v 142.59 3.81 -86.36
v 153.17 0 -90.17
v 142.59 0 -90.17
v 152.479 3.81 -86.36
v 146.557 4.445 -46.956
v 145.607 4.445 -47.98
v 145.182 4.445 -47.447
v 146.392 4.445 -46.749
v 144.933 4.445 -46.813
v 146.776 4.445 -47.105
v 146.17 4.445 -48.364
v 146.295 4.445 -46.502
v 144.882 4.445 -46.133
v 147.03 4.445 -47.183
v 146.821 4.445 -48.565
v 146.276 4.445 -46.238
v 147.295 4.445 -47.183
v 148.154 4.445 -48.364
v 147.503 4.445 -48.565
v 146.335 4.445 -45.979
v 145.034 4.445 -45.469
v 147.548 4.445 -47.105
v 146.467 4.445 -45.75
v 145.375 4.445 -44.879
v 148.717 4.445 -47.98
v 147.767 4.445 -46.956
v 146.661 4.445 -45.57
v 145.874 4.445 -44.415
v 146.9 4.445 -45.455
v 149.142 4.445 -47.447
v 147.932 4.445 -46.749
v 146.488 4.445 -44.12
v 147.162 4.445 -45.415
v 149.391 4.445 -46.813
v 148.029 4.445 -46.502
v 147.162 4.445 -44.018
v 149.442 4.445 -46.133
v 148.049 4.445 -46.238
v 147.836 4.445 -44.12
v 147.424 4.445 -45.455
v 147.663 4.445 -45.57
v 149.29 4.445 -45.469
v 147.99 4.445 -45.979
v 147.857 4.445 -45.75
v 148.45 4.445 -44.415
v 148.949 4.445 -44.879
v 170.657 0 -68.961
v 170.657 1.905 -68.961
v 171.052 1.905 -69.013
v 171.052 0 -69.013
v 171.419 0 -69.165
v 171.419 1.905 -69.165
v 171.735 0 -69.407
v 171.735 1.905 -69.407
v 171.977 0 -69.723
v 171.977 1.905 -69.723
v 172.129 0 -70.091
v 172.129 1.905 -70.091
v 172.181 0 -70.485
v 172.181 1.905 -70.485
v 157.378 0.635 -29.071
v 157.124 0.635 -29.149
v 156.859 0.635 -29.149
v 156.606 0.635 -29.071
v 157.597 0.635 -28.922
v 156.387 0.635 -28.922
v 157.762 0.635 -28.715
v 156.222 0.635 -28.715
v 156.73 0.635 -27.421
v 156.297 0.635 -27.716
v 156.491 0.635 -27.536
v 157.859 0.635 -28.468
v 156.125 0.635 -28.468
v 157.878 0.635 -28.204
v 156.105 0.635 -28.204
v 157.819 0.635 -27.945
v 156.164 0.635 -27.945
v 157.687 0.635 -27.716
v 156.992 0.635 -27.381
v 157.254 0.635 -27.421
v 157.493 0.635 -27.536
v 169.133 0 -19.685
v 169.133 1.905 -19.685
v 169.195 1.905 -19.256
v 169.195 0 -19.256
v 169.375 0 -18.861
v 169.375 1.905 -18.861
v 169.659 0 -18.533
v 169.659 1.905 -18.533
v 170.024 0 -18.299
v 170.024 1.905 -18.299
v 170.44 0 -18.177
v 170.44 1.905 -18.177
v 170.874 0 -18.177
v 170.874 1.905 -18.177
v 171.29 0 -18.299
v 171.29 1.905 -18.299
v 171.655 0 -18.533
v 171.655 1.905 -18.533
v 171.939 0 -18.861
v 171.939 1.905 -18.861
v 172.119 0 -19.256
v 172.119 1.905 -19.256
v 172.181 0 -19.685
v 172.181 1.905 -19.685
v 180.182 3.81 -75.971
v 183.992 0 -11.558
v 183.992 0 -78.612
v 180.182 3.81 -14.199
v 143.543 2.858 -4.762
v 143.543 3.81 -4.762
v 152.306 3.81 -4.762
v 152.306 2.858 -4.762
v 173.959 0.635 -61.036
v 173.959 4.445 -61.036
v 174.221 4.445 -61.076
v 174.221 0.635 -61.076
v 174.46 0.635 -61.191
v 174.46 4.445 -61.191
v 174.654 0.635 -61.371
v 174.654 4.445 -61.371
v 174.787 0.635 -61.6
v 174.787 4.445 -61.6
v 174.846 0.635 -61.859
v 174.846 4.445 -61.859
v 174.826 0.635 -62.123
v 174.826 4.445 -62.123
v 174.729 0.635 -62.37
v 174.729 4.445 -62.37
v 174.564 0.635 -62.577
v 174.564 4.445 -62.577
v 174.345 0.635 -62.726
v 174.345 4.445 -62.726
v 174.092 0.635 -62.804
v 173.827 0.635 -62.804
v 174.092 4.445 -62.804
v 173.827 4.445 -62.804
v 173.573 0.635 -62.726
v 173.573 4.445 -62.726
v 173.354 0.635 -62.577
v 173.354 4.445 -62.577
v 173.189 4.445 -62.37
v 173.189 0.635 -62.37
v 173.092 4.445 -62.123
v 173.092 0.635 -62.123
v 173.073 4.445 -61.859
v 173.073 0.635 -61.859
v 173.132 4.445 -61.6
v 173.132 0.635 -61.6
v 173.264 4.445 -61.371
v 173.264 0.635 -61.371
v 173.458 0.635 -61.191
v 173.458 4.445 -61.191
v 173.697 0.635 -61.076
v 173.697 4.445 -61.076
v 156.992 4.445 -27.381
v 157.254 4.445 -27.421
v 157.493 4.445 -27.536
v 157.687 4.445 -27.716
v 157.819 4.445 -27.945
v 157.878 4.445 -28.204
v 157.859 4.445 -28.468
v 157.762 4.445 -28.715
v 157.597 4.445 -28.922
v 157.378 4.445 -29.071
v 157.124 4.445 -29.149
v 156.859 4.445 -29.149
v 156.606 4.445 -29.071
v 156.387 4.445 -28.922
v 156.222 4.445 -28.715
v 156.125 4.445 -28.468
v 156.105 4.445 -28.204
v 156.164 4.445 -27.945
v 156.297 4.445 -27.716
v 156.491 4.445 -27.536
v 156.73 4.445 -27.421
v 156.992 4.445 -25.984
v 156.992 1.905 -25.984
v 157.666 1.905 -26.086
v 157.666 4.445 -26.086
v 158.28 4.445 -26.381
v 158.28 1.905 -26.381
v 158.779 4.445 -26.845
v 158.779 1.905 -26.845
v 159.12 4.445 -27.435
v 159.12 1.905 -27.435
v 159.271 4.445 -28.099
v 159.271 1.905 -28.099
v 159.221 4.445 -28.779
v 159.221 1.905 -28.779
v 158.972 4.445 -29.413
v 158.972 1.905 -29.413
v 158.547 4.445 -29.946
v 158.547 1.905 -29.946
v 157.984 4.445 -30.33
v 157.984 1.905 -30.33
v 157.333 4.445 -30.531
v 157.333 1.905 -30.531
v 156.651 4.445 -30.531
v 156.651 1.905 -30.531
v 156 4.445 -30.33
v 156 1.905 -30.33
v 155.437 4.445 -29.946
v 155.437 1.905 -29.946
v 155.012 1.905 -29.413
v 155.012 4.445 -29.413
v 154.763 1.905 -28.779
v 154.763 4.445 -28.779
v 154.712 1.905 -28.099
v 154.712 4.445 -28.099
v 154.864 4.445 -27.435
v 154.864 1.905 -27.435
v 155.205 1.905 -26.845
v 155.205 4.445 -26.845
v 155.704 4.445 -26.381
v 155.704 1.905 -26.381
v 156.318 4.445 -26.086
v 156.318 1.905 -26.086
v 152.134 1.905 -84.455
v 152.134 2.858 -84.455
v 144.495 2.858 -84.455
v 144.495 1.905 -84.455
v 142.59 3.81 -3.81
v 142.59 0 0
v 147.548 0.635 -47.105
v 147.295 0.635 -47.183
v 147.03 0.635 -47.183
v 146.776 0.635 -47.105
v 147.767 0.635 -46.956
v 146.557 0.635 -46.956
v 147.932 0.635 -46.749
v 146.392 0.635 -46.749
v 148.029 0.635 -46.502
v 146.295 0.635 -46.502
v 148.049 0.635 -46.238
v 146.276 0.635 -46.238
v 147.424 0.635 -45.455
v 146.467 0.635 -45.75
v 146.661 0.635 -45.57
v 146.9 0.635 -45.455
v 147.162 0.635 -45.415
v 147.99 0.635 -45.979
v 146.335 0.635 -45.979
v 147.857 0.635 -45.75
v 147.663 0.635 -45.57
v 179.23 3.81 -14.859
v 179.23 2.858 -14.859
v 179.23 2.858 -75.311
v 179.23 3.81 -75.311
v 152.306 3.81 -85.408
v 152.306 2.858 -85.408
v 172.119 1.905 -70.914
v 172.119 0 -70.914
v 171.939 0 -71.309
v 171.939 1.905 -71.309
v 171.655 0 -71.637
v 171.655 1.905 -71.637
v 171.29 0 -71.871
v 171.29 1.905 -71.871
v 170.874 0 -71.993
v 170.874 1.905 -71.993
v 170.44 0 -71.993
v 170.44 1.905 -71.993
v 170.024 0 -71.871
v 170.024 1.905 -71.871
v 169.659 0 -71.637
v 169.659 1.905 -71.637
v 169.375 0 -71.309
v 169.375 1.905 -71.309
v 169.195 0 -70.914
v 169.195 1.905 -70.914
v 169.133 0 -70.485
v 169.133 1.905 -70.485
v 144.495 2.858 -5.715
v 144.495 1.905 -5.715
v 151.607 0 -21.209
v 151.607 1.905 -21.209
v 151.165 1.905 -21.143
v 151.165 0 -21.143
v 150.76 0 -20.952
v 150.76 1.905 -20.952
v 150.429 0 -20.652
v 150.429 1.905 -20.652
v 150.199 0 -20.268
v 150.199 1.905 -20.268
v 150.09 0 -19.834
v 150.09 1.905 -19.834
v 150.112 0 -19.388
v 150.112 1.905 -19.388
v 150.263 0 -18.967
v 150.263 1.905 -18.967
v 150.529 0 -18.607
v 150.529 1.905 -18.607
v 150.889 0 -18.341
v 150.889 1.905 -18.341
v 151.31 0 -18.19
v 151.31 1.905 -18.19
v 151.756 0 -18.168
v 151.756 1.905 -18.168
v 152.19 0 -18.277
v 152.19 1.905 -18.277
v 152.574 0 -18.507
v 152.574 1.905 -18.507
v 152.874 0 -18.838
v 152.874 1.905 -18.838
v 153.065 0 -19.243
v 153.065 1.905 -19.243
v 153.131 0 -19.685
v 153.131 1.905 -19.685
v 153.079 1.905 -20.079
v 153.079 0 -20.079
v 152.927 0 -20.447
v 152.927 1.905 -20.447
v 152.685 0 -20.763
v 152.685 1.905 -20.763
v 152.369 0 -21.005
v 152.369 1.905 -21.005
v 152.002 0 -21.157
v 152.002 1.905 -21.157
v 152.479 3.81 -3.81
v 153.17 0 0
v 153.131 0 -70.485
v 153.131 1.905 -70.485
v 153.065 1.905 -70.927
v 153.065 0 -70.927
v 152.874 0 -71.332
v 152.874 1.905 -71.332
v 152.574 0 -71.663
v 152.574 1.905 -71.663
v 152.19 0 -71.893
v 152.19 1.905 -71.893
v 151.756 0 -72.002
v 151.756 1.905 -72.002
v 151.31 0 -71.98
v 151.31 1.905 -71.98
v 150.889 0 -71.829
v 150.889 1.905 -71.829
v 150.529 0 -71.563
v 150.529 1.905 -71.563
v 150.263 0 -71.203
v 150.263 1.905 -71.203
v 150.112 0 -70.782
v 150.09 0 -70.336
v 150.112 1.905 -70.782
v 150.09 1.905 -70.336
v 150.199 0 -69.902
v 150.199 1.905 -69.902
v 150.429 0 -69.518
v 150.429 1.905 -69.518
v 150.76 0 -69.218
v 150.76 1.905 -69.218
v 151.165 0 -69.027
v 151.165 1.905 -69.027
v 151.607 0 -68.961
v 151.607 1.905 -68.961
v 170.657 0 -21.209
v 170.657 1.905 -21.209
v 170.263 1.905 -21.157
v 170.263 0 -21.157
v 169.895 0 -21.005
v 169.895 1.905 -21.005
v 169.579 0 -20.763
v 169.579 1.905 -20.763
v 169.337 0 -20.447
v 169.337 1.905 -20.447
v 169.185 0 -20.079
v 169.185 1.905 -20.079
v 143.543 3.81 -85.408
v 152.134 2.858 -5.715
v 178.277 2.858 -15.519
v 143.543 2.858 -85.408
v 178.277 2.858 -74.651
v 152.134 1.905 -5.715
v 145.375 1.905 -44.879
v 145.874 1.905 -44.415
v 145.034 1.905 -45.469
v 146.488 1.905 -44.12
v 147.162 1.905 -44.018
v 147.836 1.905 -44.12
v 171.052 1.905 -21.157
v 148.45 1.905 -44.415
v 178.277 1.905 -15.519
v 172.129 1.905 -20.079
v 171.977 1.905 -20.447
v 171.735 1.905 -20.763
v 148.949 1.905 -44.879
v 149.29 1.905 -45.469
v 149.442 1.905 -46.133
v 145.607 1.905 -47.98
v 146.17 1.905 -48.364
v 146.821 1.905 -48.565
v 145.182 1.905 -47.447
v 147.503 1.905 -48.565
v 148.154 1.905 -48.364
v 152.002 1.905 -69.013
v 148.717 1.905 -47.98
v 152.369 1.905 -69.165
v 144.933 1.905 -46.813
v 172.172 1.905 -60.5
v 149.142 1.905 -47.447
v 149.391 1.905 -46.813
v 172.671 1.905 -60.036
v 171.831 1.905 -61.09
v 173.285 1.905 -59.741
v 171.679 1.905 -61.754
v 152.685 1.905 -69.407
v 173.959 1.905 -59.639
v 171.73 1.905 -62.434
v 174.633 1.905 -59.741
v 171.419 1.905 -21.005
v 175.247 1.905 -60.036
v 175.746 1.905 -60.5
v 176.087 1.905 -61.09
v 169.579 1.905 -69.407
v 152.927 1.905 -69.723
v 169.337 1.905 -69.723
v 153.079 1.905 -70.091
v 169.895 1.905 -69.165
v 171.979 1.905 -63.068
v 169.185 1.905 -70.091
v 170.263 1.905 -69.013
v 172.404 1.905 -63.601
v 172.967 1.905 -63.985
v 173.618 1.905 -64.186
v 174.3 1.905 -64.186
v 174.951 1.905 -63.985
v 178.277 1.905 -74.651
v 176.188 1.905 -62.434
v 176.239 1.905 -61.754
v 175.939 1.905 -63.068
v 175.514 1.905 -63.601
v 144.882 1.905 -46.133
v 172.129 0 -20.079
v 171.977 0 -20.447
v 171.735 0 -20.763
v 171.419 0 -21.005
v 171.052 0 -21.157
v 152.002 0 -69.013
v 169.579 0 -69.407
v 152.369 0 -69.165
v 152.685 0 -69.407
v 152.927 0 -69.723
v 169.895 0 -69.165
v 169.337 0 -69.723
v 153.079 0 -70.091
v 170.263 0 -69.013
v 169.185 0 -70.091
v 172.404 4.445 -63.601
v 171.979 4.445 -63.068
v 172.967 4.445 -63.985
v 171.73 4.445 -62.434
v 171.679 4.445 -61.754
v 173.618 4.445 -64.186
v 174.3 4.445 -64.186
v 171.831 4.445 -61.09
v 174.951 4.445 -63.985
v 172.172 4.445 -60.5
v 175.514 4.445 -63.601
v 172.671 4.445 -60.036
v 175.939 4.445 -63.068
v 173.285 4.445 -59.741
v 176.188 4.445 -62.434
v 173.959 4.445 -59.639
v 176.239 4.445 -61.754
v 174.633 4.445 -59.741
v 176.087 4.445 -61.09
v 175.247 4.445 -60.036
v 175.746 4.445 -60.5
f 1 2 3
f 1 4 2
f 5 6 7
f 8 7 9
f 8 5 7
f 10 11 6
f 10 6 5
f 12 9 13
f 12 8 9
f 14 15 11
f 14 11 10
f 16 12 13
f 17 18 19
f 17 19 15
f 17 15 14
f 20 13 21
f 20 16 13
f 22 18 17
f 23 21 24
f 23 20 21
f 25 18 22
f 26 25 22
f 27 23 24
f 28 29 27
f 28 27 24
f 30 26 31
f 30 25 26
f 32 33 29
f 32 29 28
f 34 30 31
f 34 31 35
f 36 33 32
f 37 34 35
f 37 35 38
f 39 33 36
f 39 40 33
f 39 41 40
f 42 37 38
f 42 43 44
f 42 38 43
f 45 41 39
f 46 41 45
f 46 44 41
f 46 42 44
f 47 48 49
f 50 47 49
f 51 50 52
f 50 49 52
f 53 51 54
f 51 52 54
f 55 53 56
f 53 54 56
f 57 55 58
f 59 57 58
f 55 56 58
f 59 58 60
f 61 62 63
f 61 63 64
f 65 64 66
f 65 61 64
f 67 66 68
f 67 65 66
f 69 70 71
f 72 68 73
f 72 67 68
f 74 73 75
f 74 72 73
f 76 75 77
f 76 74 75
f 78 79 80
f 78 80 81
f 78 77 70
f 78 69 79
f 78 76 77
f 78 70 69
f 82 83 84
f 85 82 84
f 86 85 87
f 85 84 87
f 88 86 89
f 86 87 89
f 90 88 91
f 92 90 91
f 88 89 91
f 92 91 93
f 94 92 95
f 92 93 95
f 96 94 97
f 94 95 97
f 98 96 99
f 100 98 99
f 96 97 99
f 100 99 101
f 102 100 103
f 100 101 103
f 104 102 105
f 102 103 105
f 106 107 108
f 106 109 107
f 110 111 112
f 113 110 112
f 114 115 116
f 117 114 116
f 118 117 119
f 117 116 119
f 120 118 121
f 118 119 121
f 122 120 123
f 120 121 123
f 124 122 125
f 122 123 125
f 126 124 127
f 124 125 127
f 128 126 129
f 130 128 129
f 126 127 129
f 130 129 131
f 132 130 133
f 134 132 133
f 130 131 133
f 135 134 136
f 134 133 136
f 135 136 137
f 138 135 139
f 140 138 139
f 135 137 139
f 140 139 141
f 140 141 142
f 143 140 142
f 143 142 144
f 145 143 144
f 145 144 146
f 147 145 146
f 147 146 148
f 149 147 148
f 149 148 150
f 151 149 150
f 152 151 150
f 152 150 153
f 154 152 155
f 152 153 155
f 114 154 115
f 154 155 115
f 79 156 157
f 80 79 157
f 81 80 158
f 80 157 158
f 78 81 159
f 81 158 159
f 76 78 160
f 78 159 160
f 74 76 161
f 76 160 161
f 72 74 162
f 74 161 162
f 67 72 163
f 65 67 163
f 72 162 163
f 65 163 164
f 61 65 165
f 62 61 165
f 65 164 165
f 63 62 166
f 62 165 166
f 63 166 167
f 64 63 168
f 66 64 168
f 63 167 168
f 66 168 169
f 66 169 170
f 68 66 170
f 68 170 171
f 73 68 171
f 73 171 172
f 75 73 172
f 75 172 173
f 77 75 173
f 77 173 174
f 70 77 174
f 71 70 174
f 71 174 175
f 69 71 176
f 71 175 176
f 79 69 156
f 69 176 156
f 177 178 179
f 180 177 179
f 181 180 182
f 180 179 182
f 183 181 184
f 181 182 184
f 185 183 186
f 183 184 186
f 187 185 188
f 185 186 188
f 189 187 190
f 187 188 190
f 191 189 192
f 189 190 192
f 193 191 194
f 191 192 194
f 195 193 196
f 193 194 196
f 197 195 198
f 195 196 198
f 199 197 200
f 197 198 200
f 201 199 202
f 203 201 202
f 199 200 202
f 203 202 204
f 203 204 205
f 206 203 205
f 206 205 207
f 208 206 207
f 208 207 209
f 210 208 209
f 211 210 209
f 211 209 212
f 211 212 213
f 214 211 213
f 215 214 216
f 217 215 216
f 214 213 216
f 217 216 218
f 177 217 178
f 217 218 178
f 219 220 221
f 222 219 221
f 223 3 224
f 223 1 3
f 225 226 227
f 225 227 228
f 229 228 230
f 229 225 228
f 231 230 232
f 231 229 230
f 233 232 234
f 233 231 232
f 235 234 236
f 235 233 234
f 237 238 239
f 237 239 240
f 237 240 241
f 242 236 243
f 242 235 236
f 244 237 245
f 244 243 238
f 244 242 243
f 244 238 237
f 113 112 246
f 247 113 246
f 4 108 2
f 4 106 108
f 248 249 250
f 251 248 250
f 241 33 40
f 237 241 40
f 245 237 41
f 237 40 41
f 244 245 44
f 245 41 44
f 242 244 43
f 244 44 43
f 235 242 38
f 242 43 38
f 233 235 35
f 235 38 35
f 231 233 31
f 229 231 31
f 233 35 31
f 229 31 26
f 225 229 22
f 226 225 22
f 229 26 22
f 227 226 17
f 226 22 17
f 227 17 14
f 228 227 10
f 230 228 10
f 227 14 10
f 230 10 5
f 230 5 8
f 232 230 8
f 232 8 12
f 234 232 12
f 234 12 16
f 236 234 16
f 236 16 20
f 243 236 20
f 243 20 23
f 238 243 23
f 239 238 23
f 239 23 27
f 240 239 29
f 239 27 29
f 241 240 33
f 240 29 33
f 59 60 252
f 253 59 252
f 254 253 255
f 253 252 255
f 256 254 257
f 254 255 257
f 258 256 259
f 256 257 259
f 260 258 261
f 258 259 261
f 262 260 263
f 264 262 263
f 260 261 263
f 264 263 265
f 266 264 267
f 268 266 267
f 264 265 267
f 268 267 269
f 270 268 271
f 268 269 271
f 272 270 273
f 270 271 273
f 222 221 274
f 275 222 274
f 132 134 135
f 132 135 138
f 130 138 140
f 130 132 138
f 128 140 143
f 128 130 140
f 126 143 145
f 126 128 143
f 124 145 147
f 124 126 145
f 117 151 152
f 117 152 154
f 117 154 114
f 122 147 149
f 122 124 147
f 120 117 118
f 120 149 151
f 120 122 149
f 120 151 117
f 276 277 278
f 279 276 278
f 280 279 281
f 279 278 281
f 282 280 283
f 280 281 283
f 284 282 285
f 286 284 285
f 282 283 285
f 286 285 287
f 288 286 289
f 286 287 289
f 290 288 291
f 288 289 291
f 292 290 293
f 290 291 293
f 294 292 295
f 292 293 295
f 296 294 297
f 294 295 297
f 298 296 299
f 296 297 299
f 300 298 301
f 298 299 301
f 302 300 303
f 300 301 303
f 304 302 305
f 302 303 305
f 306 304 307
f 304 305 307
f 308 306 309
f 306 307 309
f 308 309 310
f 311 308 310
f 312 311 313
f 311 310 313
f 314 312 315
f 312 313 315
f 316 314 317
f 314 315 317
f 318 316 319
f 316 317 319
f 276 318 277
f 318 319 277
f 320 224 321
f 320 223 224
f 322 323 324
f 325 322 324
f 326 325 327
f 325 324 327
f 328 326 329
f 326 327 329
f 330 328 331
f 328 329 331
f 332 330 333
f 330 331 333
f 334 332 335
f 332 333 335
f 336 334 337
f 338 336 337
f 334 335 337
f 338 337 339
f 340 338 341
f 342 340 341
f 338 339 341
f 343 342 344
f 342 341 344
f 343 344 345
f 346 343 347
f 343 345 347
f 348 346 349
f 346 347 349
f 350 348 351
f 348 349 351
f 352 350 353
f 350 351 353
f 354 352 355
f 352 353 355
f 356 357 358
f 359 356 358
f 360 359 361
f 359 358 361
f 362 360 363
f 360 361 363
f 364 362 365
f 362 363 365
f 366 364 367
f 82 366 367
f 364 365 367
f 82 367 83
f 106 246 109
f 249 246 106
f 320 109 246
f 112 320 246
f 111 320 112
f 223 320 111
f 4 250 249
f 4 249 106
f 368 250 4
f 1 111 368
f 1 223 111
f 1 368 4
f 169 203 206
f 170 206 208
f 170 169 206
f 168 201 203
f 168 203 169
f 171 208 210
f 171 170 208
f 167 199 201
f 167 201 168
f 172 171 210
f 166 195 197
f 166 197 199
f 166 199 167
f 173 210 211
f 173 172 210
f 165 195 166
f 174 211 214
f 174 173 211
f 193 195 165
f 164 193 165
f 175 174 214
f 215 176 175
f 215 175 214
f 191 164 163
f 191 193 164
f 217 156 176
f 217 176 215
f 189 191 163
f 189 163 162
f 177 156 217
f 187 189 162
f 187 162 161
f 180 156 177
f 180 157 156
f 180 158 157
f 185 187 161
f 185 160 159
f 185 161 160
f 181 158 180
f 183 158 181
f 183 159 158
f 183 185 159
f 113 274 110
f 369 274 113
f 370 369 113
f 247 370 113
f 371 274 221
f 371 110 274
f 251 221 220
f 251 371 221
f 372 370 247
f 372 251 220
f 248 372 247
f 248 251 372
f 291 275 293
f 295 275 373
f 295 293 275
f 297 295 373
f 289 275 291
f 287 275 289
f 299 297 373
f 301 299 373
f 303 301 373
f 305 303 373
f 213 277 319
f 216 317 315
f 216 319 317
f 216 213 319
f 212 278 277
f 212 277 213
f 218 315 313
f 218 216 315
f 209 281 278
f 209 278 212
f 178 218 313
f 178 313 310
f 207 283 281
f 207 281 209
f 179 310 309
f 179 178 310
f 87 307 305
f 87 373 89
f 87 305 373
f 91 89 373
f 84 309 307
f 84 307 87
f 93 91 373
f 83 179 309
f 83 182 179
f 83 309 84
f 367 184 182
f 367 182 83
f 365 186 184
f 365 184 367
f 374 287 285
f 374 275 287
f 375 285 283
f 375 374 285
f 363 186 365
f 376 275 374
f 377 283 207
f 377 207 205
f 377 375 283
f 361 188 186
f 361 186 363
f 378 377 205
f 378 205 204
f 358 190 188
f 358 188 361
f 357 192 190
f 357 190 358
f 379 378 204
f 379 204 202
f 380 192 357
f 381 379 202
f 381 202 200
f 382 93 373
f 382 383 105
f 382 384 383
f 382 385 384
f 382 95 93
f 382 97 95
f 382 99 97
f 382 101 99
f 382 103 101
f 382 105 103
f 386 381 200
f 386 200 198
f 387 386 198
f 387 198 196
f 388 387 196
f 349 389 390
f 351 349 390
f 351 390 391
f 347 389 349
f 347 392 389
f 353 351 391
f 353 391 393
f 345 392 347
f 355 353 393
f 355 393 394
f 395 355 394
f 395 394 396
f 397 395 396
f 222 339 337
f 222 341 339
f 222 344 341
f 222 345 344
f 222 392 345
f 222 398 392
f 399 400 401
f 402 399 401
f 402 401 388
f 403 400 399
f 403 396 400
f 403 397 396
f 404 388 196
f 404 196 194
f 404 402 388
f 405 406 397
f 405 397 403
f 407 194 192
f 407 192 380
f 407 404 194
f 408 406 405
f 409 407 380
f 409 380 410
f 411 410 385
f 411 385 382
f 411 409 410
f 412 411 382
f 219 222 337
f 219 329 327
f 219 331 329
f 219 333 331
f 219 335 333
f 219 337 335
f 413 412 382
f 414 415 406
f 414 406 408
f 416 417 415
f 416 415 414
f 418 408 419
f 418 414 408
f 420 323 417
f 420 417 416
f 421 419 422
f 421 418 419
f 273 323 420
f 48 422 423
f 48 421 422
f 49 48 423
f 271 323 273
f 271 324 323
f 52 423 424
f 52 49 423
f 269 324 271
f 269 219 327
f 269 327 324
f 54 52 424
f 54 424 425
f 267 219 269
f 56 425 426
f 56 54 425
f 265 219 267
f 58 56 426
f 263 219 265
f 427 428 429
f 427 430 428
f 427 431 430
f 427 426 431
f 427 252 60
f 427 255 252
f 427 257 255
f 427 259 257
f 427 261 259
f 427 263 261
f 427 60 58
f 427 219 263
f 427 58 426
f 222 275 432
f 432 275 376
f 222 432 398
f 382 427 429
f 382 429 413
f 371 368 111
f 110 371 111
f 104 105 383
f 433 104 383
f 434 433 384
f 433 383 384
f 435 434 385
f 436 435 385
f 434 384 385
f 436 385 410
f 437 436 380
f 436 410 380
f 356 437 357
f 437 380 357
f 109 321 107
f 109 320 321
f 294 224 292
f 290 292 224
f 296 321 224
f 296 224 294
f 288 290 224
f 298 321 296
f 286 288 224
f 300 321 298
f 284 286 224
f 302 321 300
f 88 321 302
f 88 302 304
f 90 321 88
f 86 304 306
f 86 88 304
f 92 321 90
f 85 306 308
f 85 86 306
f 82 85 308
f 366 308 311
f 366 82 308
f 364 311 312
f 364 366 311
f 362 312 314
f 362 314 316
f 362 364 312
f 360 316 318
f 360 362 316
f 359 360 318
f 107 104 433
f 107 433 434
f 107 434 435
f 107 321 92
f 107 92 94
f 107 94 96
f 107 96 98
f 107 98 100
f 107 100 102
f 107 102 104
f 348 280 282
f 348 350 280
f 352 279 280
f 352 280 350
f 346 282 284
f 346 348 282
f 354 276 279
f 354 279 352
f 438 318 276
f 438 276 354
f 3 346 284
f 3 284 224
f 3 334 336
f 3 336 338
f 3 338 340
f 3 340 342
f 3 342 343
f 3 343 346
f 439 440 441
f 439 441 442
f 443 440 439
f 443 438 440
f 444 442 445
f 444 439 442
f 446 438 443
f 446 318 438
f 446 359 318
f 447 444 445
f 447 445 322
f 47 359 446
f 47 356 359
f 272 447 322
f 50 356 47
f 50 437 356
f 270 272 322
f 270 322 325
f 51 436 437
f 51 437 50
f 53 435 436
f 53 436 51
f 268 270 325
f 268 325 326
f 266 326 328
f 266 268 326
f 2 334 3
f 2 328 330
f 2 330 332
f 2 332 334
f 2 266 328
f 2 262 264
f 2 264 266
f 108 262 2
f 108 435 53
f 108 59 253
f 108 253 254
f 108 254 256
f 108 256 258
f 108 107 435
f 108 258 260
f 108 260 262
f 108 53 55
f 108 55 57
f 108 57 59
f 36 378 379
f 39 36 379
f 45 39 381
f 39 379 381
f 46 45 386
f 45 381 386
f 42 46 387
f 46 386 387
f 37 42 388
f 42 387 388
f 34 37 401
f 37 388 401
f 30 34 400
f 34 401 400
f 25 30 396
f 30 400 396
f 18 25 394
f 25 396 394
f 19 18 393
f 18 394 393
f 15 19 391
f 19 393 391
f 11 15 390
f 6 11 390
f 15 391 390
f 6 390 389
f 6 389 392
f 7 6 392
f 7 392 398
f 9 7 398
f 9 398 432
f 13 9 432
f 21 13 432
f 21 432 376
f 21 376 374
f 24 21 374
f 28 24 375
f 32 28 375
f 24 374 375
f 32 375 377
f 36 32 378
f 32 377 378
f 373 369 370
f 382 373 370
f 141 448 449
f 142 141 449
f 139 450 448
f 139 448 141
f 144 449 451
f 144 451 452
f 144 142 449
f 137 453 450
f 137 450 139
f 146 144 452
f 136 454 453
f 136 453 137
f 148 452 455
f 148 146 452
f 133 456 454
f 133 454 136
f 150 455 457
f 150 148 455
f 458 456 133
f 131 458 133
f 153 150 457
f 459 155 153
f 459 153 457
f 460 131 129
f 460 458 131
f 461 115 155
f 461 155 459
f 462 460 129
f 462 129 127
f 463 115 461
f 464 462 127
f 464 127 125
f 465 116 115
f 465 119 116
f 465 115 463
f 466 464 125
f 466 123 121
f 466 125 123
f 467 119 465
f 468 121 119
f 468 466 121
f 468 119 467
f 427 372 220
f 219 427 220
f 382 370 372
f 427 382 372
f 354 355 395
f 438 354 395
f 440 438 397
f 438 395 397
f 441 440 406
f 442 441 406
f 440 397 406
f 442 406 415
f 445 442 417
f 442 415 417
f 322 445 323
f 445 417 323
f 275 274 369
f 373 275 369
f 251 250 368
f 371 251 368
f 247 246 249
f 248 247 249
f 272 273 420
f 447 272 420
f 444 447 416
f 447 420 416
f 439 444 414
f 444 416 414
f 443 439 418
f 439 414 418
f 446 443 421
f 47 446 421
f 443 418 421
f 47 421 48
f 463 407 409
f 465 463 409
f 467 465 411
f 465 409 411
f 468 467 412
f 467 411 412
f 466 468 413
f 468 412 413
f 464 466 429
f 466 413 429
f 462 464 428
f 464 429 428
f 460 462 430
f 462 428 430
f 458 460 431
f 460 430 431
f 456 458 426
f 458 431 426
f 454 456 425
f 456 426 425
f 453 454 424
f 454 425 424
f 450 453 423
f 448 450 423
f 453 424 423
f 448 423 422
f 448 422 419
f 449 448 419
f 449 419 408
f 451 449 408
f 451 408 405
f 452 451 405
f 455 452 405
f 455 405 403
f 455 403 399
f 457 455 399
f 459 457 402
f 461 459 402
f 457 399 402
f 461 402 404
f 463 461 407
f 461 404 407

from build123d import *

# Parameters (mm, degrees)
CUT_EXTRUDE4_DEPTH  = 1.905
SKETCH15_R          = 2.286
BOSS_EXTRUDE3_DEPTH = 2.54
SKETCH17_R          = 0.889
CUT_EXTRUDE5_DEPTH  = 3.81
CUT_EXTRUDE6_DEPTH  = 0.9525
CUT_EXTRUDE9_DEPTH  = 205.915011065


with BuildPart() as part:
    # Sketch2 → Loft3 section 0
    with BuildSketch(Plane(origin=(0, 0, 0), x_dir=(1, 0, 0), z_dir=(0, 1, 0))):
        with BuildLine():
            Line((153.170003889, 0), (183.992068321, 11.558274162))
            Line((183.992068321, 11.558274162), (183.992068321, 78.611725838))
            Line((183.992068321, 78.611725838), (153.170003889, 90.17))
            Line((153.170003889, 90.17), (142.590068321, 90.17))
            Line((142.590068321, 90.17), (142.590068321, 0))
            Line((142.590068321, 0), (153.170003889, 0))
        make_face()
    # Sketch3 → Loft3 section 1
    with BuildSketch(Plane(origin=(0, 3.81, 0), x_dir=(1, 0, 0), z_dir=(0, 1, 0))):
        with BuildLine():
            Line((142.590068321, 3.81), (142.590068321, 86.36))
            Line((142.590068321, 86.36), (152.479119132, 86.36))
            Line((152.479119132, 86.36), (180.182068321, 75.971394054))
            Line((180.182068321, 75.971394054), (180.182068321, 14.198605946))
            Line((180.182068321, 14.198605946), (152.479119132, 3.81))
            Line((152.479119132, 3.81), (142.590068321, 3.81))
        make_face()
    loft()

    # Sketch14 → Cut-Extrude4 (cut)
    with BuildSketch(Plane(origin=(0, 3.81, 0), x_dir=(1, 0, 0), z_dir=(0, 1, 0))):
        Polygon((178.277068321, 74.651228162), (152.133676754, 84.455), (144.495068321, 84.455), (144.495068321, 5.715), (152.133676754, 5.715), (178.277068321, 15.518771838), align=None)
    extrude(amount=-CUT_EXTRUDE4_DEPTH, mode=Mode.SUBTRACT)

    # Sketch15 → Boss-Extrude3 (add)
    with BuildSketch(Plane(origin=(0, 1.905, 0), x_dir=(1, 0, 0), z_dir=(0, 1, 0))):
        with Locations(Location((173.959068321, 61.9252, 0), (0, 0, 270))):
            Circle(SKETCH15_R)
        with Locations(Location((147.162068321, 46.3042, 0), (0, 0, 270))):
            Circle(SKETCH15_R)
        with Locations(Location((156.991868321, 28.2702, 0), (0, 0, 270))):
            Circle(SKETCH15_R)
    extrude(amount=BOSS_EXTRUDE3_DEPTH)

    # Sketch17 → Cut-Extrude5 (cut)
    with BuildSketch(Plane(origin=(0, 4.445, 0), x_dir=(1, 0, 0), z_dir=(0, 1, 0))):
        with Locations(Location((156.991868321, 28.2702, 0), (0, 0, 270))):
            Circle(SKETCH17_R)
        with Locations(Location((147.162068321, 46.3042, 0), (0, 0, 270))):
            Circle(SKETCH17_R)
        with Locations(Location((173.959068321, 61.9252, 0), (0, 0, 270))):
            Circle(SKETCH17_R)
    extrude(amount=-CUT_EXTRUDE5_DEPTH, mode=Mode.SUBTRACT)

    # Sketch18 → Cut-Extrude6 (cut)
    with BuildSketch(Plane(origin=(0, 3.81, 0), x_dir=(1, 0, 0), z_dir=(0, 1, 0))):
        Polygon((179.229568321, 14.858688892), (179.229568321, 75.311311108), (152.306397943, 85.4075), (143.542568321, 85.4075), (143.542568321, 4.7625), (152.306397943, 4.7625), align=None)
        Polygon((178.277068321, 15.518771838), (178.277068321, 74.651228162), (152.133676754, 84.455), (144.495068321, 84.455), (144.495068321, 5.715), (152.133676754, 5.715), align=None, mode=Mode.SUBTRACT)
    extrude(amount=-CUT_EXTRUDE6_DEPTH, mode=Mode.SUBTRACT)

    # Sketch22 → Cut-Extrude9 (cut, through all)
    with BuildSketch(Plane(origin=(0, 1.905, 0), x_dir=(1, 0, 0), z_dir=(0, 1, 0))):
        with BuildLine():
            ThreePointArc((170.657068321, 21.209), (169.579437586, 20.762630735), (169.133068321, 19.685))
            Line((169.133068321, 19.685), (170.657068321, 19.685))
            Line((170.657068321, 19.685), (170.657068321, 21.209))
        make_face()
        with BuildLine():
            Line((170.657068321, 19.685), (169.133068321, 19.685))
            ThreePointArc((169.133068321, 19.685), (170.657068321, 18.161), (172.181068321, 19.685))
            ThreePointArc((172.181068321, 19.685), (171.734699055, 20.762630735), (170.657068321, 21.209))
            Line((170.657068321, 21.209), (170.657068321, 19.685))
        make_face()
        with BuildLine():
            ThreePointArc((151.607068321, 21.209), (150.529437586, 18.607369265), (153.131068321, 19.685))
            Line((153.131068321, 19.685), (151.607068321, 19.685))
            Line((151.607068321, 19.685), (151.607068321, 21.209))
        make_face()
        with BuildLine():
            Line((151.607068321, 19.685), (153.131068321, 19.685))
            ThreePointArc((153.131068321, 19.685), (152.684699055, 20.762630735), (151.607068321, 21.209))
            Line((151.607068321, 21.209), (151.607068321, 19.685))
        make_face()
        with BuildLine():
            ThreePointArc((169.133068321, 70.485), (169.579437586, 69.407369265), (170.657068321, 68.961))
            Line((170.657068321, 68.961), (170.657068321, 70.485))
            Line((170.657068321, 70.485), (169.133068321, 70.485))
        make_face()
        with BuildLine():
            Line((170.657068321, 70.485), (170.657068321, 68.961))
            ThreePointArc((170.657068321, 68.961), (171.734699055, 69.407369265), (172.181068321, 70.485))
            ThreePointArc((172.181068321, 70.485), (170.657068321, 72.009), (169.133068321, 70.485))
            Line((169.133068321, 70.485), (170.657068321, 70.485))
        make_face()
        with BuildLine():
            ThreePointArc((153.131068321, 70.485), (150.529437586, 71.562630735), (151.607068321, 68.961))
            Line((151.607068321, 68.961), (151.607068321, 70.485))
            Line((151.607068321, 70.485), (153.131068321, 70.485))
        make_face()
        with BuildLine():
            Line((151.607068321, 70.485), (151.607068321, 68.961))
            ThreePointArc((151.607068321, 68.961), (152.684699055, 69.407369265), (153.131068321, 70.485))
            Line((153.131068321, 70.485), (151.607068321, 70.485))
        make_face()
    extrude(amount=-CUT_EXTRUDE9_DEPTH, mode=Mode.SUBTRACT)


solid = part.part
